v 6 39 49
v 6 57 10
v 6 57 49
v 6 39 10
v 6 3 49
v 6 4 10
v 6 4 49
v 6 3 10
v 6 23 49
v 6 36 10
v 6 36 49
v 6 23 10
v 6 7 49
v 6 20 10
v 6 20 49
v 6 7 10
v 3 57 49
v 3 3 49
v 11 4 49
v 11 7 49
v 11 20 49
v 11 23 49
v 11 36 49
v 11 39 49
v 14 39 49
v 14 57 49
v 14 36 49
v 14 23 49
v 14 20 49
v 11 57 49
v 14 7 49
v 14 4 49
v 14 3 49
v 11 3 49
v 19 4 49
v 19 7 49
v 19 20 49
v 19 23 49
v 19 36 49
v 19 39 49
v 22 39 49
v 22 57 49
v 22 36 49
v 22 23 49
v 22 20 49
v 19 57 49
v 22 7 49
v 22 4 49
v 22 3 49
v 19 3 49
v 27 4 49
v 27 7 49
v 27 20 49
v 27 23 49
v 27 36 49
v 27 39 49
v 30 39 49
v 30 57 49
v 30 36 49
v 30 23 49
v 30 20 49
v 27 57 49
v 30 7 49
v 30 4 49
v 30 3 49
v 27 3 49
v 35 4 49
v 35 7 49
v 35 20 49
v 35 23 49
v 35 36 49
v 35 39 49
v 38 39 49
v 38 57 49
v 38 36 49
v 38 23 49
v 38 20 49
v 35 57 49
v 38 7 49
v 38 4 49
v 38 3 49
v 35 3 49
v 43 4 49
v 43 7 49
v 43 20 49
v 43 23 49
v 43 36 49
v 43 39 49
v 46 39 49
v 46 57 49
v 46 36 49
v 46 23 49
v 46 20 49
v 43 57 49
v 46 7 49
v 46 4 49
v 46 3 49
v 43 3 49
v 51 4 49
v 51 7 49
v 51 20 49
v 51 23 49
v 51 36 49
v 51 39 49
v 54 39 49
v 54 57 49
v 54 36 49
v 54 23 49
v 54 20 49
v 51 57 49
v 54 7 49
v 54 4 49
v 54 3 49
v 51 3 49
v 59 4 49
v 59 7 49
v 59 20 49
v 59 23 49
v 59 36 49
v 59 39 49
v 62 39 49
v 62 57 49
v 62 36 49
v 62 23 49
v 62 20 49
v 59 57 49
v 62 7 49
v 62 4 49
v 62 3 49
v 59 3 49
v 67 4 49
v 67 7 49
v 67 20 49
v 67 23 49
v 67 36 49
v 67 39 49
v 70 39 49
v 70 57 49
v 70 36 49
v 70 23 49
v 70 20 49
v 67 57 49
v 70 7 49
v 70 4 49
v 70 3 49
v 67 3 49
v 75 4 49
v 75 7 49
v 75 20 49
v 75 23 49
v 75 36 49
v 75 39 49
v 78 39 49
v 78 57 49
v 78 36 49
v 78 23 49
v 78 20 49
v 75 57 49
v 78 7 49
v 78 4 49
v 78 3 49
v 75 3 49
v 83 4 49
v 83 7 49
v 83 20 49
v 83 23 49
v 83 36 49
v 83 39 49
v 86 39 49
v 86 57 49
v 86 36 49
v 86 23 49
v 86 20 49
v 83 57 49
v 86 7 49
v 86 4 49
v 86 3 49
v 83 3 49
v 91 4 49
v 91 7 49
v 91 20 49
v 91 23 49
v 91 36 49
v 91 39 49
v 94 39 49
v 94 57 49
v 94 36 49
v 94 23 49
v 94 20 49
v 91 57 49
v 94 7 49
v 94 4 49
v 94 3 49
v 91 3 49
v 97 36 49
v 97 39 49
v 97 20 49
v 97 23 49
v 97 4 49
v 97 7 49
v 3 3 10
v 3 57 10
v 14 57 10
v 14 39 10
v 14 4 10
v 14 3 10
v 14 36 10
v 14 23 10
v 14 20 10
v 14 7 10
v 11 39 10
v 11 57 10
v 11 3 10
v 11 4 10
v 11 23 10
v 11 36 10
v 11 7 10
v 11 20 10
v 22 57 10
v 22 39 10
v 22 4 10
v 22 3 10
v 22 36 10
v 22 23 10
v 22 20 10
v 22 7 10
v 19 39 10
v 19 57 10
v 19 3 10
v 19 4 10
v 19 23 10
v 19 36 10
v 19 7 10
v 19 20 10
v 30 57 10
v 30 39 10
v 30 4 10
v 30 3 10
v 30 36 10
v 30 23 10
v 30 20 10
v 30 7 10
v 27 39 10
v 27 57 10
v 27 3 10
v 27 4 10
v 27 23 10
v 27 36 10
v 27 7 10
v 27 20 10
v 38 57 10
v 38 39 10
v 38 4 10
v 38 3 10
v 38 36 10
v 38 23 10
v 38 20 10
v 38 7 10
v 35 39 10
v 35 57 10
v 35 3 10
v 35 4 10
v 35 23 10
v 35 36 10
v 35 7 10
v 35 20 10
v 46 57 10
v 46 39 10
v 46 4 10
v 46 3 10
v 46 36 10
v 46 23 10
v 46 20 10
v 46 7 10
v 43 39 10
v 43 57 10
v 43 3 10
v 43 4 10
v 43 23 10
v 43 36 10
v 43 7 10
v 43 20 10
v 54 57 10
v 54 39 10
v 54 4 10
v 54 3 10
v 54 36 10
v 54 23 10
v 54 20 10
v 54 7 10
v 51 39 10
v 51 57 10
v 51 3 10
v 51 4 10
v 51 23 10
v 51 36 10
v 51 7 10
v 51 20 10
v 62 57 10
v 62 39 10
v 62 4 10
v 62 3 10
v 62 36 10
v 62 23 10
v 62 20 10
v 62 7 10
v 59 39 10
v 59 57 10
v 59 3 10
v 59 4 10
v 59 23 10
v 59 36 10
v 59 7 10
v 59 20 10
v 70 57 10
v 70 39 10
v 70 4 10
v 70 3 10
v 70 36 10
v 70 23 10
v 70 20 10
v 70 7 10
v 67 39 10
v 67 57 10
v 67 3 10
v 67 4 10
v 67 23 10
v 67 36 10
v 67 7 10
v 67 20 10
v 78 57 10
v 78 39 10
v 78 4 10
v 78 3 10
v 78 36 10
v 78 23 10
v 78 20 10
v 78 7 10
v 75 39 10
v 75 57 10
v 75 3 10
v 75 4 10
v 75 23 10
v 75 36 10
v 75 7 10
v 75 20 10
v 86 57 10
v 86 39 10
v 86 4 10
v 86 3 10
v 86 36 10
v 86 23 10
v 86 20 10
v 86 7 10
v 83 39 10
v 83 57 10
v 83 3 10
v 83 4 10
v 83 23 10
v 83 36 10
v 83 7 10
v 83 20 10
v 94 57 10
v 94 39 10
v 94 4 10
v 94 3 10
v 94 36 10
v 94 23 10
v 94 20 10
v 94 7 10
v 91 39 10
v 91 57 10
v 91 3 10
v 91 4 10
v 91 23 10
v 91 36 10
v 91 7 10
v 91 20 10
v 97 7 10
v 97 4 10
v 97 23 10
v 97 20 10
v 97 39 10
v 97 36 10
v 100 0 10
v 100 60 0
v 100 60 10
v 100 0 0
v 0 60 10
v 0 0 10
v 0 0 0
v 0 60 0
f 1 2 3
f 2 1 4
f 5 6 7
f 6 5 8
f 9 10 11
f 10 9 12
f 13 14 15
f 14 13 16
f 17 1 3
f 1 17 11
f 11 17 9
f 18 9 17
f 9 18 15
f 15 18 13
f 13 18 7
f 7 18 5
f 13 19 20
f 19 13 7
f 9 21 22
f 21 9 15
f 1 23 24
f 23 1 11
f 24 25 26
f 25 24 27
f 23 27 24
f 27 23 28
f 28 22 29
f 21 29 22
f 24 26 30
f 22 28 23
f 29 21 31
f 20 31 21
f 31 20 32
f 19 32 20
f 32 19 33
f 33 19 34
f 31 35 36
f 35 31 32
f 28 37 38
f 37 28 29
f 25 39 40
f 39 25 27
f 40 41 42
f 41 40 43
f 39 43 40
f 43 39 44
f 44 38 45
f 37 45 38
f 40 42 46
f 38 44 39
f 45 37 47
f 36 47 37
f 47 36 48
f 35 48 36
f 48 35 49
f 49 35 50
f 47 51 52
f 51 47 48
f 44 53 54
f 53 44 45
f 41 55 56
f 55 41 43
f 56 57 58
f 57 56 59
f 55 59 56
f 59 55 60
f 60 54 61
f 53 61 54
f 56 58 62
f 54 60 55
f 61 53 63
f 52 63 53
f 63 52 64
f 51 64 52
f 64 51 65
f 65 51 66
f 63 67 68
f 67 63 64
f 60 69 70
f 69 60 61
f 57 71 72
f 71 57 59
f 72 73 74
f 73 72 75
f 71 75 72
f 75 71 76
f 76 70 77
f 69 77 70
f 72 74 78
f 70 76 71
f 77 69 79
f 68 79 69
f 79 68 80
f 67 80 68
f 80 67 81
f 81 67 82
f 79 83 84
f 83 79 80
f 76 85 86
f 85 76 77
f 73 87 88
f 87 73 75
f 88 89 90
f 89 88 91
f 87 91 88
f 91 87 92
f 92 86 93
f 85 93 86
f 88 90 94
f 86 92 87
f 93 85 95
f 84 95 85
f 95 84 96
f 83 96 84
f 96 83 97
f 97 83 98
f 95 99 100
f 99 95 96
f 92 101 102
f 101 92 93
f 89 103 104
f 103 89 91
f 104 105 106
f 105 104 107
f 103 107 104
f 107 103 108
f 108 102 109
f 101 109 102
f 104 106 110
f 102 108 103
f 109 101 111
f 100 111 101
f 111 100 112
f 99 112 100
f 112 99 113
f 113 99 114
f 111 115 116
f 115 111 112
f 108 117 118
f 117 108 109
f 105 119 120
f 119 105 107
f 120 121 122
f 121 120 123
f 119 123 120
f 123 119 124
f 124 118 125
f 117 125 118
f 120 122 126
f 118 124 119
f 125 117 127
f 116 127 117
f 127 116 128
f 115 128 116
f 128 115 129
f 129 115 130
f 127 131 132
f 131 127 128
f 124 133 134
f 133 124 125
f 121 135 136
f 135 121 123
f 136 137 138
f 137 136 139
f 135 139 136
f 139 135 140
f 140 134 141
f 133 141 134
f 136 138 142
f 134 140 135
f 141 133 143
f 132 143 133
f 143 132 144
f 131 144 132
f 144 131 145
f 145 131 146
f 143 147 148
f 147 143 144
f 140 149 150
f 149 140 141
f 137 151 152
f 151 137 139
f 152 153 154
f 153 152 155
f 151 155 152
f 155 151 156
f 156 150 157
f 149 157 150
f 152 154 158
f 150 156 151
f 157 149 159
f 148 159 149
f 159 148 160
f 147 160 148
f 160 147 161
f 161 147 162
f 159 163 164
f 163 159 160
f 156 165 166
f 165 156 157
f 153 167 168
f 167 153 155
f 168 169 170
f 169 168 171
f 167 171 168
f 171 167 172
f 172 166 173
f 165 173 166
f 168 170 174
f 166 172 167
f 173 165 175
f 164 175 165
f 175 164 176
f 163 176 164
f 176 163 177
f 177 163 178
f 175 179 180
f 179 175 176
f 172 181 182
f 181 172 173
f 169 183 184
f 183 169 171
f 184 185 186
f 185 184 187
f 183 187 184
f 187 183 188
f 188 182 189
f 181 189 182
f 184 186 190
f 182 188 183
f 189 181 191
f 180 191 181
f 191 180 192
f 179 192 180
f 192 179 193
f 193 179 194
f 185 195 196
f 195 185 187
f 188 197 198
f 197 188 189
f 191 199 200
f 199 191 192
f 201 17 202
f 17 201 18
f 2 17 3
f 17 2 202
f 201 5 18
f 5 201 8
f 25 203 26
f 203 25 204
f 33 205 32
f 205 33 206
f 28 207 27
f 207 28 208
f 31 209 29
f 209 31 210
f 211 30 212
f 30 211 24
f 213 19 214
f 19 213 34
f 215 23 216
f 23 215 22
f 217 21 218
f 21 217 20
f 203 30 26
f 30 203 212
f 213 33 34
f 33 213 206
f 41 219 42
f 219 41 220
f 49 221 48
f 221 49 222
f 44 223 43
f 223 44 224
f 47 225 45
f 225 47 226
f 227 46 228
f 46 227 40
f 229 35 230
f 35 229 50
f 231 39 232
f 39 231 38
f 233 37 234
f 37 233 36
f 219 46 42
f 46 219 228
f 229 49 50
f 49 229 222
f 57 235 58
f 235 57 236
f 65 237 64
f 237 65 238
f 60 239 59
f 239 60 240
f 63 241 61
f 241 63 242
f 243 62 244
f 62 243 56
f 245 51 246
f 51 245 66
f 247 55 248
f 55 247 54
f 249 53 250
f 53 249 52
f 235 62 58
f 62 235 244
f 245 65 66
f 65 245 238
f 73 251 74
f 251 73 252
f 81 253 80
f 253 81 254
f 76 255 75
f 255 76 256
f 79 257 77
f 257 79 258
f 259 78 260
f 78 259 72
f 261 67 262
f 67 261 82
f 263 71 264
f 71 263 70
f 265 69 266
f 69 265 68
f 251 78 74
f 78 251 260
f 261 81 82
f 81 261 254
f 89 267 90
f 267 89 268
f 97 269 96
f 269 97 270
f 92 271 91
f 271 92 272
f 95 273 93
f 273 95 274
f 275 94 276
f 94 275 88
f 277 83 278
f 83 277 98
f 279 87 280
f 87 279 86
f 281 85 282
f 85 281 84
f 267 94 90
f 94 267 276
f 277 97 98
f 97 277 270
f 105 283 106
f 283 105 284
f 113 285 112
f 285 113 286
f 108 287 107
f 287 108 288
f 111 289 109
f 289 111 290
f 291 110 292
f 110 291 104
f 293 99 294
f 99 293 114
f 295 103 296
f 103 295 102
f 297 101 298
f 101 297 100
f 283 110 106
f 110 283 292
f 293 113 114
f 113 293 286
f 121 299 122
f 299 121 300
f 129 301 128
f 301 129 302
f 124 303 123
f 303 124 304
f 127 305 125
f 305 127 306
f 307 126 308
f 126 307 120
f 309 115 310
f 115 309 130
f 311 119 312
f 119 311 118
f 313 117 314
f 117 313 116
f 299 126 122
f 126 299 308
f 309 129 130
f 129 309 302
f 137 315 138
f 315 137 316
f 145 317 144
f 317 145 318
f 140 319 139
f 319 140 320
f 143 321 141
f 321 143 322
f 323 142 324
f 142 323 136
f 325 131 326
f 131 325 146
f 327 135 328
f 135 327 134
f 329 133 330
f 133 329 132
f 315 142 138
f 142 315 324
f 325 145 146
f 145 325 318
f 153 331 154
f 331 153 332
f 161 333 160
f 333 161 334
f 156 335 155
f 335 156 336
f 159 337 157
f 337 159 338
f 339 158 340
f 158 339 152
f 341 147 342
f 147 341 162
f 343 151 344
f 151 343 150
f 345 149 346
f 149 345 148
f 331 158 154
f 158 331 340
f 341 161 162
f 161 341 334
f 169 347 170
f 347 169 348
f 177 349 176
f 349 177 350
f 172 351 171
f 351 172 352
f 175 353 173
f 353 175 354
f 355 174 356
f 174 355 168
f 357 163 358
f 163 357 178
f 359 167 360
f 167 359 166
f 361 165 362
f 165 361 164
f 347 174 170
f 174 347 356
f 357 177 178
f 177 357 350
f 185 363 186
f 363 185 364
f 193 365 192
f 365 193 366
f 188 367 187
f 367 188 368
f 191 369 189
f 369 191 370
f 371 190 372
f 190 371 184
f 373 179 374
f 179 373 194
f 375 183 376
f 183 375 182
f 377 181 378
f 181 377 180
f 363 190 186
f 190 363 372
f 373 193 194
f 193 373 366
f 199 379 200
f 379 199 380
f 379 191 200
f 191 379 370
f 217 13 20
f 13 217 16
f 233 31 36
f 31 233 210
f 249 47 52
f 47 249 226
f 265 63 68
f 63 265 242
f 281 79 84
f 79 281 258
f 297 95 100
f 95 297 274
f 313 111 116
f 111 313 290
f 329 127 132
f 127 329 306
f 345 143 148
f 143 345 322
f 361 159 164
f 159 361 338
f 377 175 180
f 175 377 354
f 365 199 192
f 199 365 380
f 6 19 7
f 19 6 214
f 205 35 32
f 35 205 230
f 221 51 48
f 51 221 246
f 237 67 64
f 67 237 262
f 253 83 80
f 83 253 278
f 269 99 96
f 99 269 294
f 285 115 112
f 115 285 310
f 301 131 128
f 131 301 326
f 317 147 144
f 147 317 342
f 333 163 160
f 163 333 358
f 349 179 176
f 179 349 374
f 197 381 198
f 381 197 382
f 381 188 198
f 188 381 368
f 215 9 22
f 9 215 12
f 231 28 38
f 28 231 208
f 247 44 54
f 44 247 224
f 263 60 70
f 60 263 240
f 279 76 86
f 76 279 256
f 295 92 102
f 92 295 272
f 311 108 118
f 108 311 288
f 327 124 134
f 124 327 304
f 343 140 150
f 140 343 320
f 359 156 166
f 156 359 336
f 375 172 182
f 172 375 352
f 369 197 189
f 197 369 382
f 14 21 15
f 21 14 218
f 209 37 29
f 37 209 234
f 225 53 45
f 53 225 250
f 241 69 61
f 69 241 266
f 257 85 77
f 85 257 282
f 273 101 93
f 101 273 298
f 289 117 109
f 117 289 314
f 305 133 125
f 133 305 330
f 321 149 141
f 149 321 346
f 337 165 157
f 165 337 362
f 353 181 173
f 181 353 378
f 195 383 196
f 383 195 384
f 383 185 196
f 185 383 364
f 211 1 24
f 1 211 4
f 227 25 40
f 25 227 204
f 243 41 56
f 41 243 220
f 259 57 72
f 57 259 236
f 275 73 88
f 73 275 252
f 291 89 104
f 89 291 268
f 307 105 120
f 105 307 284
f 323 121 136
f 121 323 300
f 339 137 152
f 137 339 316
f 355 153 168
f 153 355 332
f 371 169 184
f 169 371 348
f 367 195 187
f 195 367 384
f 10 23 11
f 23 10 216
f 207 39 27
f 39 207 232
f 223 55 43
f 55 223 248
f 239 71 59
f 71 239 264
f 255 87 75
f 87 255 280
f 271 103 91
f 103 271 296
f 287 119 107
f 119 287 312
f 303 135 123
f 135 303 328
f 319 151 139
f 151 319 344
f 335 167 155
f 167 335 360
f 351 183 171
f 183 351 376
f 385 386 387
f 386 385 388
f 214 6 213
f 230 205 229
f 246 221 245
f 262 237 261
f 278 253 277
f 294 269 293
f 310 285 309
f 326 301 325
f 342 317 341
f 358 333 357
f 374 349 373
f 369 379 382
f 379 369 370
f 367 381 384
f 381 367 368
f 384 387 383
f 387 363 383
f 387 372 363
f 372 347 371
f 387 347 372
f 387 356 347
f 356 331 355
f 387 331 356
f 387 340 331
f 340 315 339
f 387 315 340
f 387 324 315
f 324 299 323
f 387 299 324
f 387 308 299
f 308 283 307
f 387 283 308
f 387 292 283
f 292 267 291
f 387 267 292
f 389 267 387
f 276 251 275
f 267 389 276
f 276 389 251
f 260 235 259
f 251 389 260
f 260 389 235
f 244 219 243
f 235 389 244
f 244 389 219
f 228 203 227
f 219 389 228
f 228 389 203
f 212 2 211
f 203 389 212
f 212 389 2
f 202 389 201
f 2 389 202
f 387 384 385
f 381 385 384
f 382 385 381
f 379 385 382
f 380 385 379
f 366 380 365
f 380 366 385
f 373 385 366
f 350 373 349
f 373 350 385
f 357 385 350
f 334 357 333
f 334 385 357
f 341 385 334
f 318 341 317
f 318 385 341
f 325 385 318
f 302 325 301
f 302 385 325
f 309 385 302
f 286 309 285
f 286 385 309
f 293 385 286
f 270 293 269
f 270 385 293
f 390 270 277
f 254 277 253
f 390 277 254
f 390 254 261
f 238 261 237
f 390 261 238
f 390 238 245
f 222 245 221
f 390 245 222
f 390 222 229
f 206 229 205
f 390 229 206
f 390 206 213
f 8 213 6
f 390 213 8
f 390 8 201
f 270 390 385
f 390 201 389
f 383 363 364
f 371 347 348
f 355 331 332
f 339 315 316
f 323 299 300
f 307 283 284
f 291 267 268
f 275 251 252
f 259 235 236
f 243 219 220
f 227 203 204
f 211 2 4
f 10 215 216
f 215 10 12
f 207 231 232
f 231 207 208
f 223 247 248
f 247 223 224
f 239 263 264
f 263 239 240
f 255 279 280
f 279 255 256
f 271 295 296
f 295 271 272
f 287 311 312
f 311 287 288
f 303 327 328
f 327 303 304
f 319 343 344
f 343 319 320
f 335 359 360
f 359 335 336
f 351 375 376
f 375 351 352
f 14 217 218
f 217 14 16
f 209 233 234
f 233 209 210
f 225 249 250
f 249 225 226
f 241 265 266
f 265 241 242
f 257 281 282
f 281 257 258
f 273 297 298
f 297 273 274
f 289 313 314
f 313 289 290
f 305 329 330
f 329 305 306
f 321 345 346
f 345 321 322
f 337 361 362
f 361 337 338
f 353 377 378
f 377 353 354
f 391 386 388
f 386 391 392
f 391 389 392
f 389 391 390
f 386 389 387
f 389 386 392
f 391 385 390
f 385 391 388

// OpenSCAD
$fn = 32;

// ----------------------------------------------------------------------
// Heatsink: cross fin block
// ----------------------------------------------------------------------

// --- parameters (mm) ---
base_l = 100;             // base length, X
base_w = 60;              // base width, Y
base_t = 10;              // base plate thickness
fin_h = 40;               // fin height above the base
fin_t = 3;                // fin thickness
edge = 3;                 // margin from the base ends
pitch = 8;                // fin pitch
rib_pitch = 16;           // cross rib pitch

n_fins = floor((base_l - 2 * edge - fin_t) / pitch) + 1;  // fin count
total_h = base_t + fin_h - 1;  // overall height
n_ribs = floor((base_w - 2 * edge) / rib_pitch);  // rib count

union() {
  cube([base_l, base_w, base_t]);
  for (i = [0 : n_fins - 1])
    translate([edge + i * pitch, edge, base_t - 1])
      cube([fin_t, base_w - 2 * edge, fin_h]);
  for (i = [0 : n_ribs - 1])
    translate([edge, edge + 1 + i * rib_pitch, base_t - 1])
      cube([base_l - 2 * edge, fin_t, fin_h]);
}
